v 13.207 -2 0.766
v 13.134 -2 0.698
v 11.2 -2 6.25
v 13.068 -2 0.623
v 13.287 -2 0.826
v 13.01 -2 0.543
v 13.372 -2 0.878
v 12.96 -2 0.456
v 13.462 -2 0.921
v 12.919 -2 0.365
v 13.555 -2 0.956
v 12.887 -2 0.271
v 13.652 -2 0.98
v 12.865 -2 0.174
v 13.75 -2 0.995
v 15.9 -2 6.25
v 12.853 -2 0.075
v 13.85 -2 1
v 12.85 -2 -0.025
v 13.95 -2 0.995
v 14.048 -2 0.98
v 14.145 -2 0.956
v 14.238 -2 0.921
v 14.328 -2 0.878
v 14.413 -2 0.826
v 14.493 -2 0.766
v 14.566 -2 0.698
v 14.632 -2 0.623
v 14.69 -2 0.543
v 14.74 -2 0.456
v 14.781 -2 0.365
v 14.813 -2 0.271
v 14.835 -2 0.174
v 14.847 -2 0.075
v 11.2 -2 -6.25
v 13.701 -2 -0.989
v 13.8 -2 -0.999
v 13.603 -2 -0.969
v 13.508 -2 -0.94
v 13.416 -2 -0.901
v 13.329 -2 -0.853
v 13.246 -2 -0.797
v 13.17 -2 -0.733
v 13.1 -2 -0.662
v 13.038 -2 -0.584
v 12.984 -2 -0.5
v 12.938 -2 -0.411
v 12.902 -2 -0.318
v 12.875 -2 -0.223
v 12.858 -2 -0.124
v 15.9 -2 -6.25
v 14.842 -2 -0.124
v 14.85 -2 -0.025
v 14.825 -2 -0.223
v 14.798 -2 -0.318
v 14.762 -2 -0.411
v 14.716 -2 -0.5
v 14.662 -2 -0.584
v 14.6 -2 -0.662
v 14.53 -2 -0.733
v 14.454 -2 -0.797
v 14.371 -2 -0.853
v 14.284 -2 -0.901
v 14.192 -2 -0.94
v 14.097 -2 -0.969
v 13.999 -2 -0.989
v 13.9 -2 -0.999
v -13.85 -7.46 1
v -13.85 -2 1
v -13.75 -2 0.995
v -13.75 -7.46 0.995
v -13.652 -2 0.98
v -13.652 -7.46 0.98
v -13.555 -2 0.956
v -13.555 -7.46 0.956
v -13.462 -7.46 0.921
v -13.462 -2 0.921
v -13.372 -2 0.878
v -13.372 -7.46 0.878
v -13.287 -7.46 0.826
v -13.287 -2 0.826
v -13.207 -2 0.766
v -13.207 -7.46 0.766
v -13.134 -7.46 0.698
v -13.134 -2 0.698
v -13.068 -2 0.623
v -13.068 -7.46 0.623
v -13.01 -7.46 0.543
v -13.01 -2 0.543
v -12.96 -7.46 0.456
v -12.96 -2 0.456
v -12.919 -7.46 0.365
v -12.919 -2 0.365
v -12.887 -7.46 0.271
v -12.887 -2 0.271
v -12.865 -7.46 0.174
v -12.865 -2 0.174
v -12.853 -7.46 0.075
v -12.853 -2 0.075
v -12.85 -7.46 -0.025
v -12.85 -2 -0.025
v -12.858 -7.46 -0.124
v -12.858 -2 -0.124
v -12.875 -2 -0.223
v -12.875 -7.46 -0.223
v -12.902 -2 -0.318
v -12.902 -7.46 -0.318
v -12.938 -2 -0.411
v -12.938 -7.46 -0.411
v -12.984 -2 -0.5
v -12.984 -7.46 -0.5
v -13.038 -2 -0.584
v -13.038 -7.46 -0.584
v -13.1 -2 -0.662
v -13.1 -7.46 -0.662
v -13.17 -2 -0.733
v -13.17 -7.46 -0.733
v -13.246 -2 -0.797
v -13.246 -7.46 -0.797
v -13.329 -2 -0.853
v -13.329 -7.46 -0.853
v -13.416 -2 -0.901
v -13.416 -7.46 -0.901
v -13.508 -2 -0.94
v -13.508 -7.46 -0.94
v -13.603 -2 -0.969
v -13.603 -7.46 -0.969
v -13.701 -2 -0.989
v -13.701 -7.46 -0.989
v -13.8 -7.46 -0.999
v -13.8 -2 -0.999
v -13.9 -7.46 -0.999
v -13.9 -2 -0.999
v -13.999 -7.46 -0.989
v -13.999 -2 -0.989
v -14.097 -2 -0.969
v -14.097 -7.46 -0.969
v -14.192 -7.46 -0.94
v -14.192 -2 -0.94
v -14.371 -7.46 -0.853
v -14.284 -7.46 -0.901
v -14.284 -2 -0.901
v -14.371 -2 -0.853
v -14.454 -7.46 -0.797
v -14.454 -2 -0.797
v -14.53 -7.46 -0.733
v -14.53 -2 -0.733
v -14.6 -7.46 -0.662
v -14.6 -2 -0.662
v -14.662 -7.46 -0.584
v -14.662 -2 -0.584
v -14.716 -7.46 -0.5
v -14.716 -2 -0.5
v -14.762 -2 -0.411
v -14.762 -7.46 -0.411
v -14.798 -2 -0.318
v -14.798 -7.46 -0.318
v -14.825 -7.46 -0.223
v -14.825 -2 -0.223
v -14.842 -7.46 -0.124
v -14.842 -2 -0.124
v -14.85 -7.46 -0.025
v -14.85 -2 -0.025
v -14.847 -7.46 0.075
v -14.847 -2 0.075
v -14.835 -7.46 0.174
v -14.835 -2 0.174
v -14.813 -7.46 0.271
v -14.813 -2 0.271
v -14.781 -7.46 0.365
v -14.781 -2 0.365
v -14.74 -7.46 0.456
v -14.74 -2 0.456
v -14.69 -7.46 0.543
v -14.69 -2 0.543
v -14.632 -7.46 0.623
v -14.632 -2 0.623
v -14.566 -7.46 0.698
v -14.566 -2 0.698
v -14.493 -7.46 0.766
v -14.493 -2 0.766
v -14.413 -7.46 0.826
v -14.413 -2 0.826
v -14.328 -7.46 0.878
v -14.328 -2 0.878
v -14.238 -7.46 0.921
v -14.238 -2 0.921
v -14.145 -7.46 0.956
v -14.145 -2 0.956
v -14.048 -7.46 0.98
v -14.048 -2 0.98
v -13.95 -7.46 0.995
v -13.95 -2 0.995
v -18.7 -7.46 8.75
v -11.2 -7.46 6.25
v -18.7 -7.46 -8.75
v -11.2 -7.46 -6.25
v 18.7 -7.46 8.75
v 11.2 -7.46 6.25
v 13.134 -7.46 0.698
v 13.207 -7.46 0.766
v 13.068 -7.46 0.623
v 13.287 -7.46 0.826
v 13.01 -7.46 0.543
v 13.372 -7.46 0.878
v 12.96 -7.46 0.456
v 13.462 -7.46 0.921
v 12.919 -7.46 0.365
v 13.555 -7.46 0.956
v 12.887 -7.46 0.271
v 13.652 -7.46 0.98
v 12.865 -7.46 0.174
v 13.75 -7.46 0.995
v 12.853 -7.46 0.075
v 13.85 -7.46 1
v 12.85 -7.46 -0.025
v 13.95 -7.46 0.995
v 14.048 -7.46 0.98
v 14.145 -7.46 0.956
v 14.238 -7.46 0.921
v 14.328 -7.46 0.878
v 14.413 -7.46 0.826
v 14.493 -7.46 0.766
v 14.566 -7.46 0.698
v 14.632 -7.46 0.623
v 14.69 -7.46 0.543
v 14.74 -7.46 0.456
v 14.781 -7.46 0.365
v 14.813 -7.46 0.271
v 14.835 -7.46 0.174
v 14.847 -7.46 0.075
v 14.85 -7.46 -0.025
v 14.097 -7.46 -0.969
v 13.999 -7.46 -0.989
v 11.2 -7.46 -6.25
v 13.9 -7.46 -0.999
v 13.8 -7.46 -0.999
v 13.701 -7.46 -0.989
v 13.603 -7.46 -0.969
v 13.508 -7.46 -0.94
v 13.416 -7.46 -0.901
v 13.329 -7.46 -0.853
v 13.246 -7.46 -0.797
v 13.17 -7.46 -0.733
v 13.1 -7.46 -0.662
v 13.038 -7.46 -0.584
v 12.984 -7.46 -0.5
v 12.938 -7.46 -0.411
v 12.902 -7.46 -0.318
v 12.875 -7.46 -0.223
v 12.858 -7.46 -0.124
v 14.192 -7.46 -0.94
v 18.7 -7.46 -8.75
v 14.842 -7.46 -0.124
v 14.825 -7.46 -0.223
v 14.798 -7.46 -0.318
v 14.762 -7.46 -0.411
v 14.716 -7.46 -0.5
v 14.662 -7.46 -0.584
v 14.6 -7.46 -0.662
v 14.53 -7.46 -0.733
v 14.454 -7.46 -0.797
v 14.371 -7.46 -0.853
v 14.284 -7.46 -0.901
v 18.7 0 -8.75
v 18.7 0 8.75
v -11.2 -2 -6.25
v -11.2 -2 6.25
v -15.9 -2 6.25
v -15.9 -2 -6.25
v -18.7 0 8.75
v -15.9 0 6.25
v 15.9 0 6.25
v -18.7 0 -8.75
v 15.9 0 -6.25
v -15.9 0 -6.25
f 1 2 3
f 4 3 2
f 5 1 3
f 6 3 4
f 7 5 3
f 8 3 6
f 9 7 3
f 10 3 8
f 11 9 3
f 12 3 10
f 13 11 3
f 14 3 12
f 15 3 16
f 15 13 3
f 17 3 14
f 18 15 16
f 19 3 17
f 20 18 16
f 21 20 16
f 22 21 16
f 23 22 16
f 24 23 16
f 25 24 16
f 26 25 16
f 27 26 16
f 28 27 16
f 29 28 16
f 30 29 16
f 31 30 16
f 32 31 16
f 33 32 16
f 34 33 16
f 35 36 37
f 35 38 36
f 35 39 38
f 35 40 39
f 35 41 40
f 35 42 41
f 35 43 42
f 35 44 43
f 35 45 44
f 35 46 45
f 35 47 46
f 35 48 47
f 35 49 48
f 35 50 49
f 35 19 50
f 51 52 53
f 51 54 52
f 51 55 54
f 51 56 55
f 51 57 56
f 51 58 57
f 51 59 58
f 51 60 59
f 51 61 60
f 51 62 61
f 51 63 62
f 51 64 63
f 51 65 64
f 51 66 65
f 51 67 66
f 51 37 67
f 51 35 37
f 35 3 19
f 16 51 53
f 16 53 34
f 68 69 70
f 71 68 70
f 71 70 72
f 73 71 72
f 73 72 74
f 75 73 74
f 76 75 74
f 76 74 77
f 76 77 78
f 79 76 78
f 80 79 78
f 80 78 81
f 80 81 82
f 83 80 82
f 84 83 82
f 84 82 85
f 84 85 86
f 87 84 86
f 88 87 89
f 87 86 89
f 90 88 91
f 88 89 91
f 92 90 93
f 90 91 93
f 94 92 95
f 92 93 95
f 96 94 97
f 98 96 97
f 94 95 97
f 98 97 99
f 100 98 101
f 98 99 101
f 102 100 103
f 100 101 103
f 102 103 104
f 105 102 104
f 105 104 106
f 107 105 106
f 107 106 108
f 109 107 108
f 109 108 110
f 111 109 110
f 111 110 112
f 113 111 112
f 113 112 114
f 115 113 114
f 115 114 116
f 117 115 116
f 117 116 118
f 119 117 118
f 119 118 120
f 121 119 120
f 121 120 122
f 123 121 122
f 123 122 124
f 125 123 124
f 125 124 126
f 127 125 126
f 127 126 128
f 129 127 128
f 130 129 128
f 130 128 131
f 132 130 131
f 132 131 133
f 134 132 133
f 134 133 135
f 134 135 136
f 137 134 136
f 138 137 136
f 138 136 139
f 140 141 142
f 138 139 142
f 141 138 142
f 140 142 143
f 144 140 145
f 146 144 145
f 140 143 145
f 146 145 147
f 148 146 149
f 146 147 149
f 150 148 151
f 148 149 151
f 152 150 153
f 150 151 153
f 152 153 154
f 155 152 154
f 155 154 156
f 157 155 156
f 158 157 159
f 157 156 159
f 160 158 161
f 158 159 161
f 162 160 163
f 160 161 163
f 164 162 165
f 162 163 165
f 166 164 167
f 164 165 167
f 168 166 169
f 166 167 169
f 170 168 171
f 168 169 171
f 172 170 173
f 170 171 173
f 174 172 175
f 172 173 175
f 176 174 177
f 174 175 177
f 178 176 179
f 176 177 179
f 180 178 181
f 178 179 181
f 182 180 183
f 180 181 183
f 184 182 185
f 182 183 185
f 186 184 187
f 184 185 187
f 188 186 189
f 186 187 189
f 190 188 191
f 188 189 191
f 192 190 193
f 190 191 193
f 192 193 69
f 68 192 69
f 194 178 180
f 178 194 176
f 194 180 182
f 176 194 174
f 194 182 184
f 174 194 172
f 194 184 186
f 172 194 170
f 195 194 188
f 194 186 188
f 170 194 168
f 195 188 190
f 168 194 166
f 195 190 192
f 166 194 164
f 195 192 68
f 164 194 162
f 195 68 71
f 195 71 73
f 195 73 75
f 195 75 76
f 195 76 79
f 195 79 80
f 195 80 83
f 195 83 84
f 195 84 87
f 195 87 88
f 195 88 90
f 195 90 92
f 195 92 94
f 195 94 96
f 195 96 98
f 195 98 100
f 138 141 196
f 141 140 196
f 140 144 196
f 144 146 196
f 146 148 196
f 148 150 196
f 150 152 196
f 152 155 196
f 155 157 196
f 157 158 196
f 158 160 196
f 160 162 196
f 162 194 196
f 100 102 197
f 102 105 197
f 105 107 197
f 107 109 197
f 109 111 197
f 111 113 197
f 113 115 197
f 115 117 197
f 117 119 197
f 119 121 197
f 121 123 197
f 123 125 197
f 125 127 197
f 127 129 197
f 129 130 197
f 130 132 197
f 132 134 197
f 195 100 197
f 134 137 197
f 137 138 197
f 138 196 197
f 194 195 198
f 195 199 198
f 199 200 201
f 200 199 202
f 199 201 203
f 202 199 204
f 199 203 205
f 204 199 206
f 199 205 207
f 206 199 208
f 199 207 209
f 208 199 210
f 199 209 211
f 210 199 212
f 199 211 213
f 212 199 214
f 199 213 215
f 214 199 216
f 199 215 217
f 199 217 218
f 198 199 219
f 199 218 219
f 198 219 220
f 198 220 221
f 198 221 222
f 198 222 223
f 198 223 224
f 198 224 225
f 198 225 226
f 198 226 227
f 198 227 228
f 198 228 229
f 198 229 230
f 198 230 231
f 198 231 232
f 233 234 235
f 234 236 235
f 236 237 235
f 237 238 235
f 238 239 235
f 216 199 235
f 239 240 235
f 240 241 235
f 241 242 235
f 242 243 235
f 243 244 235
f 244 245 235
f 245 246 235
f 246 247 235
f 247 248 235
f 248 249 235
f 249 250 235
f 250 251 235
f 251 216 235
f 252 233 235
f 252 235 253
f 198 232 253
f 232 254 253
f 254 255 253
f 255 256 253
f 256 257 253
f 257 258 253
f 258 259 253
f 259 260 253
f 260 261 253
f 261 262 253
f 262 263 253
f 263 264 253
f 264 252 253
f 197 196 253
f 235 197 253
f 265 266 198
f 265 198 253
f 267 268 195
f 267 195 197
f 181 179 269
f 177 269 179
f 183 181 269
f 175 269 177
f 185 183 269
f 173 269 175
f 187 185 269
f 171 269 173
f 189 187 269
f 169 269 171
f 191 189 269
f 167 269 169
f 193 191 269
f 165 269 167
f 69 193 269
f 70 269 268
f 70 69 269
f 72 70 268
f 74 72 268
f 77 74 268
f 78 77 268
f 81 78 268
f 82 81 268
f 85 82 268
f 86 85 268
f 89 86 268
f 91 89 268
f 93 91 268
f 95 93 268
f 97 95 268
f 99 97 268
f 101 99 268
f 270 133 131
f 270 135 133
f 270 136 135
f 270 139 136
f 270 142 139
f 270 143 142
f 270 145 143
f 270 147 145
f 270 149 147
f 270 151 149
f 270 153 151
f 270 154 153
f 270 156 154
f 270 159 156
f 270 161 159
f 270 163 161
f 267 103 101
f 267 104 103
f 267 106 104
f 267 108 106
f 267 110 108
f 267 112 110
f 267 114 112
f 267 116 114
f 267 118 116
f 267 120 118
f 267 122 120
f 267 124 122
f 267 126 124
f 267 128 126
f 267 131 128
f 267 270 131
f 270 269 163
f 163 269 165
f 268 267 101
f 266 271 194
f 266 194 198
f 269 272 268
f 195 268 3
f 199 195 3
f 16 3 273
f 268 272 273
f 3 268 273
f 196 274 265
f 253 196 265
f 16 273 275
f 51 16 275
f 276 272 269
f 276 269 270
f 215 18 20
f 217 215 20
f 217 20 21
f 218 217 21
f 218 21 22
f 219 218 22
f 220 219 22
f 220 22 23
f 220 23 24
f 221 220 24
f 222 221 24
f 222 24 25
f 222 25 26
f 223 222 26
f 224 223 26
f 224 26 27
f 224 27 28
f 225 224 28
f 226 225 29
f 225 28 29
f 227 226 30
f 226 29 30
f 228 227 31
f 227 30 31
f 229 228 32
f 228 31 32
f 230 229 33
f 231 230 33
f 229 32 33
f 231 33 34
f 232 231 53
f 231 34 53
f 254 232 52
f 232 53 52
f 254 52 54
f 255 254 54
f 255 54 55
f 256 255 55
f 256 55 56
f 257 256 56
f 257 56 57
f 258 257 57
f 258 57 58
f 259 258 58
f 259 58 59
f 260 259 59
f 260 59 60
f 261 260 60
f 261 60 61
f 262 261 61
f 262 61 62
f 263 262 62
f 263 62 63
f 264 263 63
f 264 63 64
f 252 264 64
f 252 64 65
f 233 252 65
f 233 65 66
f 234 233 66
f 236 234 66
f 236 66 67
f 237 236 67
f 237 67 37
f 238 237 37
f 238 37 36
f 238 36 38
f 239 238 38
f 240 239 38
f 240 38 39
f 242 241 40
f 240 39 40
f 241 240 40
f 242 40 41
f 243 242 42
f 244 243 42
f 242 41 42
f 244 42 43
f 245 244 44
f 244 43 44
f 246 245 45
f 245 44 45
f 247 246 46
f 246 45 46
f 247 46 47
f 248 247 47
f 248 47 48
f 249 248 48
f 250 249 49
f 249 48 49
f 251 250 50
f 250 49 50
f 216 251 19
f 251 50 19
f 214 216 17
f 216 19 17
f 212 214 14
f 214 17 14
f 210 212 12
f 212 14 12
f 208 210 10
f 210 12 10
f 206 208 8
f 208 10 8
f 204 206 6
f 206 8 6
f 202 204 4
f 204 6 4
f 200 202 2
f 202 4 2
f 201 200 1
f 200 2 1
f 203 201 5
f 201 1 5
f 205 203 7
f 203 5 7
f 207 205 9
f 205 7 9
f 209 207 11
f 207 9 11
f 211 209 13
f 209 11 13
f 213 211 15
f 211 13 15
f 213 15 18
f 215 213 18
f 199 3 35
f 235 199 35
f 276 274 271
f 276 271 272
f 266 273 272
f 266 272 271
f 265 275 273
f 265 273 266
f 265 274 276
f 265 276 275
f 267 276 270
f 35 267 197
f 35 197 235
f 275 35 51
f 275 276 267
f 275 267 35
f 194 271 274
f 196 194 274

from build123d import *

# Parameters (mm, degrees)
SKETCH1_W           = 37.4
SKETCH1_H           = 17.5
SKETCH1_R           = 1
SKETCH1_W_2         = 22.4
SKETCH1_H_2         = 12.5
BOSS_EXTRUDE1_DEPTH = 7.46
SKETCH2_W           = 31.8
SKETCH2_H           = 12.5
CUT_EXTRUDE1_DEPTH  = 2


with BuildPart() as part:
    # Sketch1 → Boss-Extrude1 (new body)
    with BuildSketch(Plane(origin=(0, 0, 0), x_dir=(1, 0, 0), z_dir=(0, 1, 0))):
        Rectangle(SKETCH1_W, SKETCH1_H)
        with Locations(Location((13.85, 0, 0), (0, 0, 270))):
            Circle(SKETCH1_R, mode=Mode.SUBTRACT)
        with Locations(Location((-13.85, 0, 0), (0, 0, 270))):
            Circle(SKETCH1_R, mode=Mode.SUBTRACT)
        Rectangle(SKETCH1_W_2, SKETCH1_H_2, mode=Mode.SUBTRACT)
    extrude(amount=-BOSS_EXTRUDE1_DEPTH)

    # Sketch2 → Cut-Extrude1 (cut)
    with BuildSketch(Plane(origin=(0, 0, 0), x_dir=(1, 0, 0), z_dir=(0, 1, 0))):
        Rectangle(SKETCH2_W, SKETCH2_H)
    extrude(amount=-CUT_EXTRUDE1_DEPTH, mode=Mode.SUBTRACT)


solid = part.part
